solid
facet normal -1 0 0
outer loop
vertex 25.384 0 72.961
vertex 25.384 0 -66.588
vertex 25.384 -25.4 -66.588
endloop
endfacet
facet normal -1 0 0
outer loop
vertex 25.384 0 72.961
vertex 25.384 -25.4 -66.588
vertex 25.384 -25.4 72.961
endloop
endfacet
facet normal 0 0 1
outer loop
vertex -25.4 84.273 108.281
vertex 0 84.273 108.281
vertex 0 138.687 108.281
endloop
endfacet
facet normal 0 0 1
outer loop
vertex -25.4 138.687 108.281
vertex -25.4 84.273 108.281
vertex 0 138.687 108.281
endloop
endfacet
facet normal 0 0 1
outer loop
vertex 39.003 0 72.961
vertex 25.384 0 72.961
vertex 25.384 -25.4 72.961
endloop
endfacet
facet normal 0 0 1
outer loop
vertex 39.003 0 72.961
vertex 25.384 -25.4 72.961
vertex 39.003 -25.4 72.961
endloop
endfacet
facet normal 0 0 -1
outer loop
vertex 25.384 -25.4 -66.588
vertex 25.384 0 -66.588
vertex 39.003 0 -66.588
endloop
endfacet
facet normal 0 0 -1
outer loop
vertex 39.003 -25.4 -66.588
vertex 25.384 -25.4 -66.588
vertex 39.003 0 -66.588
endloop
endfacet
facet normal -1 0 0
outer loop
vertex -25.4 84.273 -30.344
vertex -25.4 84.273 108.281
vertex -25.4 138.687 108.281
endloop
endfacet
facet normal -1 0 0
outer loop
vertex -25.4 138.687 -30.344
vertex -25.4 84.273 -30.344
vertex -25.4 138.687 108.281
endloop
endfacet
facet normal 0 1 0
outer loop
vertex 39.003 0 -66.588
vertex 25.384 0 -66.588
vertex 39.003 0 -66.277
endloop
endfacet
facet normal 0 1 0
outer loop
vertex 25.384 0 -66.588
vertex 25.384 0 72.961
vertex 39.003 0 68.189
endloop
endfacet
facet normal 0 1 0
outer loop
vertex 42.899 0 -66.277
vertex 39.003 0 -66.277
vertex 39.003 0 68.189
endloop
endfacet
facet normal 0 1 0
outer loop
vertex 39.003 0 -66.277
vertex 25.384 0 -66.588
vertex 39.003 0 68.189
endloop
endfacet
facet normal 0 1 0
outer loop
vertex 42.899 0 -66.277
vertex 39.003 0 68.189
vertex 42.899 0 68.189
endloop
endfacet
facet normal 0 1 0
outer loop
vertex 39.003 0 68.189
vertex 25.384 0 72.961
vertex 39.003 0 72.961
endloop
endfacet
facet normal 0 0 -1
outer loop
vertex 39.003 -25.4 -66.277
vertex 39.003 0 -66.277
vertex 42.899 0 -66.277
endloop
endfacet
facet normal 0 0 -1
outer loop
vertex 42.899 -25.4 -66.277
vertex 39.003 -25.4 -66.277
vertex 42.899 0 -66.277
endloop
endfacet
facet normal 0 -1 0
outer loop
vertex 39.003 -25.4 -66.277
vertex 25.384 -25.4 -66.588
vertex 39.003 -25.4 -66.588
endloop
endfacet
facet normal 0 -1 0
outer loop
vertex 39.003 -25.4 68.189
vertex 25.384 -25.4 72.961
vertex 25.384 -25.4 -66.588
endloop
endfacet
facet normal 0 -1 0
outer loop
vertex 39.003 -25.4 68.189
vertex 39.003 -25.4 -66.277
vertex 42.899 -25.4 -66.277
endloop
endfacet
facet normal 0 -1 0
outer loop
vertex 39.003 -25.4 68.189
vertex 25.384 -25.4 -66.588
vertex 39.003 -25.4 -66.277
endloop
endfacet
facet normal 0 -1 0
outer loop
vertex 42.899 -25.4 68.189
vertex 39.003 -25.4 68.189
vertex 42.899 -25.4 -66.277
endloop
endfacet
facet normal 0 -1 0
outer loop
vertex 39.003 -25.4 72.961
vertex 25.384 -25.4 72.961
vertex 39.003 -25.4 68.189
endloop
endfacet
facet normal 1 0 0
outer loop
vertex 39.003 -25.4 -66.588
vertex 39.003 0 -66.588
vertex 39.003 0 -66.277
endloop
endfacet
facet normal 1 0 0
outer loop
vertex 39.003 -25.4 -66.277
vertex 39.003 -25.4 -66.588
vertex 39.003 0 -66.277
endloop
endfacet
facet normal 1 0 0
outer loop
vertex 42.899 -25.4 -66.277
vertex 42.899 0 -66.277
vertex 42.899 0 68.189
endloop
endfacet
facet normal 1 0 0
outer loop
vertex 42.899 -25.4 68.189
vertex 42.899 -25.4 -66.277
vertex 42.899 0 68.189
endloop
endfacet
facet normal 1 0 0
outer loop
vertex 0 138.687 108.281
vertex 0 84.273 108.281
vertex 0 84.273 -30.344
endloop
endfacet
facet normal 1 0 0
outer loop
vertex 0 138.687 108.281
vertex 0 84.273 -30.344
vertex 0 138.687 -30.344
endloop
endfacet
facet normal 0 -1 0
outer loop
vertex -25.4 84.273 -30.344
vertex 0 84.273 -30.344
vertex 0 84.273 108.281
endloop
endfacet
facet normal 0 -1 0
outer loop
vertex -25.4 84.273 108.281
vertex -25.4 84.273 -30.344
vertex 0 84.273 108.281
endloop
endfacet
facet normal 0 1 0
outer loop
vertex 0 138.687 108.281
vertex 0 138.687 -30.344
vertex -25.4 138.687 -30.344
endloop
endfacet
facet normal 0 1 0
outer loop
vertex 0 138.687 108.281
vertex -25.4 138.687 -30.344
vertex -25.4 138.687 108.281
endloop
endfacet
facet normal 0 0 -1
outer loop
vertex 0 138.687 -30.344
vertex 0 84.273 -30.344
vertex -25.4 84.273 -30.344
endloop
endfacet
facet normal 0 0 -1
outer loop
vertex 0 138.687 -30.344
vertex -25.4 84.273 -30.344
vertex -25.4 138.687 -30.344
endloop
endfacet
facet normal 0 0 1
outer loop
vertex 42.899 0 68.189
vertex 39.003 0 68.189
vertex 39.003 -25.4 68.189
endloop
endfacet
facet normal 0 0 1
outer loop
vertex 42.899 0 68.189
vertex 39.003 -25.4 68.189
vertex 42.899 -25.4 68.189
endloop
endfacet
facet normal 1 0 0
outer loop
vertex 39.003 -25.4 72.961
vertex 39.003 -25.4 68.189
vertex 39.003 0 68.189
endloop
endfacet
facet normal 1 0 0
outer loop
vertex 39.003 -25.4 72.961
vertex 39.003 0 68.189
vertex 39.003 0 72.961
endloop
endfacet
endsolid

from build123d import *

# Parameters (mm, degrees)
F0_W     = 54.413997
F0_H     = 138.625599
F1_DEPTH = 25.4
F2_W     = 12.544077
F2_H     = 134.466797
F3_DEPTH = 25.4
F4_W     = 13.618799
F4_H     = 139.549188
F5_DEPTH = 25.4


with BuildPart() as f1:
    # F0 (on Right) → F1 (new body)
    with BuildSketch(Plane.YZ):
        with Locations((111.480463, 38.968597)):
            Rectangle(F0_W, F0_H)
    extrude(amount=-F1_DEPTH)


with BuildPart() as f3:
    # F2 (on Front) → F3 (new body)
    with BuildSketch(Plane.XZ):
        with Locations((36.626769, 0.956074)):
            Rectangle(F2_W, F2_H)
    extrude(amount=F3_DEPTH)

    # F4 (on Front) → F5 (join)
    with BuildSketch(Plane.XZ):
        with Locations((32.193213, 3.186252)):
            Rectangle(F4_W, F4_H)
    extrude(amount=F5_DEPTH)


solid = Compound([f1.part, f3.part])
